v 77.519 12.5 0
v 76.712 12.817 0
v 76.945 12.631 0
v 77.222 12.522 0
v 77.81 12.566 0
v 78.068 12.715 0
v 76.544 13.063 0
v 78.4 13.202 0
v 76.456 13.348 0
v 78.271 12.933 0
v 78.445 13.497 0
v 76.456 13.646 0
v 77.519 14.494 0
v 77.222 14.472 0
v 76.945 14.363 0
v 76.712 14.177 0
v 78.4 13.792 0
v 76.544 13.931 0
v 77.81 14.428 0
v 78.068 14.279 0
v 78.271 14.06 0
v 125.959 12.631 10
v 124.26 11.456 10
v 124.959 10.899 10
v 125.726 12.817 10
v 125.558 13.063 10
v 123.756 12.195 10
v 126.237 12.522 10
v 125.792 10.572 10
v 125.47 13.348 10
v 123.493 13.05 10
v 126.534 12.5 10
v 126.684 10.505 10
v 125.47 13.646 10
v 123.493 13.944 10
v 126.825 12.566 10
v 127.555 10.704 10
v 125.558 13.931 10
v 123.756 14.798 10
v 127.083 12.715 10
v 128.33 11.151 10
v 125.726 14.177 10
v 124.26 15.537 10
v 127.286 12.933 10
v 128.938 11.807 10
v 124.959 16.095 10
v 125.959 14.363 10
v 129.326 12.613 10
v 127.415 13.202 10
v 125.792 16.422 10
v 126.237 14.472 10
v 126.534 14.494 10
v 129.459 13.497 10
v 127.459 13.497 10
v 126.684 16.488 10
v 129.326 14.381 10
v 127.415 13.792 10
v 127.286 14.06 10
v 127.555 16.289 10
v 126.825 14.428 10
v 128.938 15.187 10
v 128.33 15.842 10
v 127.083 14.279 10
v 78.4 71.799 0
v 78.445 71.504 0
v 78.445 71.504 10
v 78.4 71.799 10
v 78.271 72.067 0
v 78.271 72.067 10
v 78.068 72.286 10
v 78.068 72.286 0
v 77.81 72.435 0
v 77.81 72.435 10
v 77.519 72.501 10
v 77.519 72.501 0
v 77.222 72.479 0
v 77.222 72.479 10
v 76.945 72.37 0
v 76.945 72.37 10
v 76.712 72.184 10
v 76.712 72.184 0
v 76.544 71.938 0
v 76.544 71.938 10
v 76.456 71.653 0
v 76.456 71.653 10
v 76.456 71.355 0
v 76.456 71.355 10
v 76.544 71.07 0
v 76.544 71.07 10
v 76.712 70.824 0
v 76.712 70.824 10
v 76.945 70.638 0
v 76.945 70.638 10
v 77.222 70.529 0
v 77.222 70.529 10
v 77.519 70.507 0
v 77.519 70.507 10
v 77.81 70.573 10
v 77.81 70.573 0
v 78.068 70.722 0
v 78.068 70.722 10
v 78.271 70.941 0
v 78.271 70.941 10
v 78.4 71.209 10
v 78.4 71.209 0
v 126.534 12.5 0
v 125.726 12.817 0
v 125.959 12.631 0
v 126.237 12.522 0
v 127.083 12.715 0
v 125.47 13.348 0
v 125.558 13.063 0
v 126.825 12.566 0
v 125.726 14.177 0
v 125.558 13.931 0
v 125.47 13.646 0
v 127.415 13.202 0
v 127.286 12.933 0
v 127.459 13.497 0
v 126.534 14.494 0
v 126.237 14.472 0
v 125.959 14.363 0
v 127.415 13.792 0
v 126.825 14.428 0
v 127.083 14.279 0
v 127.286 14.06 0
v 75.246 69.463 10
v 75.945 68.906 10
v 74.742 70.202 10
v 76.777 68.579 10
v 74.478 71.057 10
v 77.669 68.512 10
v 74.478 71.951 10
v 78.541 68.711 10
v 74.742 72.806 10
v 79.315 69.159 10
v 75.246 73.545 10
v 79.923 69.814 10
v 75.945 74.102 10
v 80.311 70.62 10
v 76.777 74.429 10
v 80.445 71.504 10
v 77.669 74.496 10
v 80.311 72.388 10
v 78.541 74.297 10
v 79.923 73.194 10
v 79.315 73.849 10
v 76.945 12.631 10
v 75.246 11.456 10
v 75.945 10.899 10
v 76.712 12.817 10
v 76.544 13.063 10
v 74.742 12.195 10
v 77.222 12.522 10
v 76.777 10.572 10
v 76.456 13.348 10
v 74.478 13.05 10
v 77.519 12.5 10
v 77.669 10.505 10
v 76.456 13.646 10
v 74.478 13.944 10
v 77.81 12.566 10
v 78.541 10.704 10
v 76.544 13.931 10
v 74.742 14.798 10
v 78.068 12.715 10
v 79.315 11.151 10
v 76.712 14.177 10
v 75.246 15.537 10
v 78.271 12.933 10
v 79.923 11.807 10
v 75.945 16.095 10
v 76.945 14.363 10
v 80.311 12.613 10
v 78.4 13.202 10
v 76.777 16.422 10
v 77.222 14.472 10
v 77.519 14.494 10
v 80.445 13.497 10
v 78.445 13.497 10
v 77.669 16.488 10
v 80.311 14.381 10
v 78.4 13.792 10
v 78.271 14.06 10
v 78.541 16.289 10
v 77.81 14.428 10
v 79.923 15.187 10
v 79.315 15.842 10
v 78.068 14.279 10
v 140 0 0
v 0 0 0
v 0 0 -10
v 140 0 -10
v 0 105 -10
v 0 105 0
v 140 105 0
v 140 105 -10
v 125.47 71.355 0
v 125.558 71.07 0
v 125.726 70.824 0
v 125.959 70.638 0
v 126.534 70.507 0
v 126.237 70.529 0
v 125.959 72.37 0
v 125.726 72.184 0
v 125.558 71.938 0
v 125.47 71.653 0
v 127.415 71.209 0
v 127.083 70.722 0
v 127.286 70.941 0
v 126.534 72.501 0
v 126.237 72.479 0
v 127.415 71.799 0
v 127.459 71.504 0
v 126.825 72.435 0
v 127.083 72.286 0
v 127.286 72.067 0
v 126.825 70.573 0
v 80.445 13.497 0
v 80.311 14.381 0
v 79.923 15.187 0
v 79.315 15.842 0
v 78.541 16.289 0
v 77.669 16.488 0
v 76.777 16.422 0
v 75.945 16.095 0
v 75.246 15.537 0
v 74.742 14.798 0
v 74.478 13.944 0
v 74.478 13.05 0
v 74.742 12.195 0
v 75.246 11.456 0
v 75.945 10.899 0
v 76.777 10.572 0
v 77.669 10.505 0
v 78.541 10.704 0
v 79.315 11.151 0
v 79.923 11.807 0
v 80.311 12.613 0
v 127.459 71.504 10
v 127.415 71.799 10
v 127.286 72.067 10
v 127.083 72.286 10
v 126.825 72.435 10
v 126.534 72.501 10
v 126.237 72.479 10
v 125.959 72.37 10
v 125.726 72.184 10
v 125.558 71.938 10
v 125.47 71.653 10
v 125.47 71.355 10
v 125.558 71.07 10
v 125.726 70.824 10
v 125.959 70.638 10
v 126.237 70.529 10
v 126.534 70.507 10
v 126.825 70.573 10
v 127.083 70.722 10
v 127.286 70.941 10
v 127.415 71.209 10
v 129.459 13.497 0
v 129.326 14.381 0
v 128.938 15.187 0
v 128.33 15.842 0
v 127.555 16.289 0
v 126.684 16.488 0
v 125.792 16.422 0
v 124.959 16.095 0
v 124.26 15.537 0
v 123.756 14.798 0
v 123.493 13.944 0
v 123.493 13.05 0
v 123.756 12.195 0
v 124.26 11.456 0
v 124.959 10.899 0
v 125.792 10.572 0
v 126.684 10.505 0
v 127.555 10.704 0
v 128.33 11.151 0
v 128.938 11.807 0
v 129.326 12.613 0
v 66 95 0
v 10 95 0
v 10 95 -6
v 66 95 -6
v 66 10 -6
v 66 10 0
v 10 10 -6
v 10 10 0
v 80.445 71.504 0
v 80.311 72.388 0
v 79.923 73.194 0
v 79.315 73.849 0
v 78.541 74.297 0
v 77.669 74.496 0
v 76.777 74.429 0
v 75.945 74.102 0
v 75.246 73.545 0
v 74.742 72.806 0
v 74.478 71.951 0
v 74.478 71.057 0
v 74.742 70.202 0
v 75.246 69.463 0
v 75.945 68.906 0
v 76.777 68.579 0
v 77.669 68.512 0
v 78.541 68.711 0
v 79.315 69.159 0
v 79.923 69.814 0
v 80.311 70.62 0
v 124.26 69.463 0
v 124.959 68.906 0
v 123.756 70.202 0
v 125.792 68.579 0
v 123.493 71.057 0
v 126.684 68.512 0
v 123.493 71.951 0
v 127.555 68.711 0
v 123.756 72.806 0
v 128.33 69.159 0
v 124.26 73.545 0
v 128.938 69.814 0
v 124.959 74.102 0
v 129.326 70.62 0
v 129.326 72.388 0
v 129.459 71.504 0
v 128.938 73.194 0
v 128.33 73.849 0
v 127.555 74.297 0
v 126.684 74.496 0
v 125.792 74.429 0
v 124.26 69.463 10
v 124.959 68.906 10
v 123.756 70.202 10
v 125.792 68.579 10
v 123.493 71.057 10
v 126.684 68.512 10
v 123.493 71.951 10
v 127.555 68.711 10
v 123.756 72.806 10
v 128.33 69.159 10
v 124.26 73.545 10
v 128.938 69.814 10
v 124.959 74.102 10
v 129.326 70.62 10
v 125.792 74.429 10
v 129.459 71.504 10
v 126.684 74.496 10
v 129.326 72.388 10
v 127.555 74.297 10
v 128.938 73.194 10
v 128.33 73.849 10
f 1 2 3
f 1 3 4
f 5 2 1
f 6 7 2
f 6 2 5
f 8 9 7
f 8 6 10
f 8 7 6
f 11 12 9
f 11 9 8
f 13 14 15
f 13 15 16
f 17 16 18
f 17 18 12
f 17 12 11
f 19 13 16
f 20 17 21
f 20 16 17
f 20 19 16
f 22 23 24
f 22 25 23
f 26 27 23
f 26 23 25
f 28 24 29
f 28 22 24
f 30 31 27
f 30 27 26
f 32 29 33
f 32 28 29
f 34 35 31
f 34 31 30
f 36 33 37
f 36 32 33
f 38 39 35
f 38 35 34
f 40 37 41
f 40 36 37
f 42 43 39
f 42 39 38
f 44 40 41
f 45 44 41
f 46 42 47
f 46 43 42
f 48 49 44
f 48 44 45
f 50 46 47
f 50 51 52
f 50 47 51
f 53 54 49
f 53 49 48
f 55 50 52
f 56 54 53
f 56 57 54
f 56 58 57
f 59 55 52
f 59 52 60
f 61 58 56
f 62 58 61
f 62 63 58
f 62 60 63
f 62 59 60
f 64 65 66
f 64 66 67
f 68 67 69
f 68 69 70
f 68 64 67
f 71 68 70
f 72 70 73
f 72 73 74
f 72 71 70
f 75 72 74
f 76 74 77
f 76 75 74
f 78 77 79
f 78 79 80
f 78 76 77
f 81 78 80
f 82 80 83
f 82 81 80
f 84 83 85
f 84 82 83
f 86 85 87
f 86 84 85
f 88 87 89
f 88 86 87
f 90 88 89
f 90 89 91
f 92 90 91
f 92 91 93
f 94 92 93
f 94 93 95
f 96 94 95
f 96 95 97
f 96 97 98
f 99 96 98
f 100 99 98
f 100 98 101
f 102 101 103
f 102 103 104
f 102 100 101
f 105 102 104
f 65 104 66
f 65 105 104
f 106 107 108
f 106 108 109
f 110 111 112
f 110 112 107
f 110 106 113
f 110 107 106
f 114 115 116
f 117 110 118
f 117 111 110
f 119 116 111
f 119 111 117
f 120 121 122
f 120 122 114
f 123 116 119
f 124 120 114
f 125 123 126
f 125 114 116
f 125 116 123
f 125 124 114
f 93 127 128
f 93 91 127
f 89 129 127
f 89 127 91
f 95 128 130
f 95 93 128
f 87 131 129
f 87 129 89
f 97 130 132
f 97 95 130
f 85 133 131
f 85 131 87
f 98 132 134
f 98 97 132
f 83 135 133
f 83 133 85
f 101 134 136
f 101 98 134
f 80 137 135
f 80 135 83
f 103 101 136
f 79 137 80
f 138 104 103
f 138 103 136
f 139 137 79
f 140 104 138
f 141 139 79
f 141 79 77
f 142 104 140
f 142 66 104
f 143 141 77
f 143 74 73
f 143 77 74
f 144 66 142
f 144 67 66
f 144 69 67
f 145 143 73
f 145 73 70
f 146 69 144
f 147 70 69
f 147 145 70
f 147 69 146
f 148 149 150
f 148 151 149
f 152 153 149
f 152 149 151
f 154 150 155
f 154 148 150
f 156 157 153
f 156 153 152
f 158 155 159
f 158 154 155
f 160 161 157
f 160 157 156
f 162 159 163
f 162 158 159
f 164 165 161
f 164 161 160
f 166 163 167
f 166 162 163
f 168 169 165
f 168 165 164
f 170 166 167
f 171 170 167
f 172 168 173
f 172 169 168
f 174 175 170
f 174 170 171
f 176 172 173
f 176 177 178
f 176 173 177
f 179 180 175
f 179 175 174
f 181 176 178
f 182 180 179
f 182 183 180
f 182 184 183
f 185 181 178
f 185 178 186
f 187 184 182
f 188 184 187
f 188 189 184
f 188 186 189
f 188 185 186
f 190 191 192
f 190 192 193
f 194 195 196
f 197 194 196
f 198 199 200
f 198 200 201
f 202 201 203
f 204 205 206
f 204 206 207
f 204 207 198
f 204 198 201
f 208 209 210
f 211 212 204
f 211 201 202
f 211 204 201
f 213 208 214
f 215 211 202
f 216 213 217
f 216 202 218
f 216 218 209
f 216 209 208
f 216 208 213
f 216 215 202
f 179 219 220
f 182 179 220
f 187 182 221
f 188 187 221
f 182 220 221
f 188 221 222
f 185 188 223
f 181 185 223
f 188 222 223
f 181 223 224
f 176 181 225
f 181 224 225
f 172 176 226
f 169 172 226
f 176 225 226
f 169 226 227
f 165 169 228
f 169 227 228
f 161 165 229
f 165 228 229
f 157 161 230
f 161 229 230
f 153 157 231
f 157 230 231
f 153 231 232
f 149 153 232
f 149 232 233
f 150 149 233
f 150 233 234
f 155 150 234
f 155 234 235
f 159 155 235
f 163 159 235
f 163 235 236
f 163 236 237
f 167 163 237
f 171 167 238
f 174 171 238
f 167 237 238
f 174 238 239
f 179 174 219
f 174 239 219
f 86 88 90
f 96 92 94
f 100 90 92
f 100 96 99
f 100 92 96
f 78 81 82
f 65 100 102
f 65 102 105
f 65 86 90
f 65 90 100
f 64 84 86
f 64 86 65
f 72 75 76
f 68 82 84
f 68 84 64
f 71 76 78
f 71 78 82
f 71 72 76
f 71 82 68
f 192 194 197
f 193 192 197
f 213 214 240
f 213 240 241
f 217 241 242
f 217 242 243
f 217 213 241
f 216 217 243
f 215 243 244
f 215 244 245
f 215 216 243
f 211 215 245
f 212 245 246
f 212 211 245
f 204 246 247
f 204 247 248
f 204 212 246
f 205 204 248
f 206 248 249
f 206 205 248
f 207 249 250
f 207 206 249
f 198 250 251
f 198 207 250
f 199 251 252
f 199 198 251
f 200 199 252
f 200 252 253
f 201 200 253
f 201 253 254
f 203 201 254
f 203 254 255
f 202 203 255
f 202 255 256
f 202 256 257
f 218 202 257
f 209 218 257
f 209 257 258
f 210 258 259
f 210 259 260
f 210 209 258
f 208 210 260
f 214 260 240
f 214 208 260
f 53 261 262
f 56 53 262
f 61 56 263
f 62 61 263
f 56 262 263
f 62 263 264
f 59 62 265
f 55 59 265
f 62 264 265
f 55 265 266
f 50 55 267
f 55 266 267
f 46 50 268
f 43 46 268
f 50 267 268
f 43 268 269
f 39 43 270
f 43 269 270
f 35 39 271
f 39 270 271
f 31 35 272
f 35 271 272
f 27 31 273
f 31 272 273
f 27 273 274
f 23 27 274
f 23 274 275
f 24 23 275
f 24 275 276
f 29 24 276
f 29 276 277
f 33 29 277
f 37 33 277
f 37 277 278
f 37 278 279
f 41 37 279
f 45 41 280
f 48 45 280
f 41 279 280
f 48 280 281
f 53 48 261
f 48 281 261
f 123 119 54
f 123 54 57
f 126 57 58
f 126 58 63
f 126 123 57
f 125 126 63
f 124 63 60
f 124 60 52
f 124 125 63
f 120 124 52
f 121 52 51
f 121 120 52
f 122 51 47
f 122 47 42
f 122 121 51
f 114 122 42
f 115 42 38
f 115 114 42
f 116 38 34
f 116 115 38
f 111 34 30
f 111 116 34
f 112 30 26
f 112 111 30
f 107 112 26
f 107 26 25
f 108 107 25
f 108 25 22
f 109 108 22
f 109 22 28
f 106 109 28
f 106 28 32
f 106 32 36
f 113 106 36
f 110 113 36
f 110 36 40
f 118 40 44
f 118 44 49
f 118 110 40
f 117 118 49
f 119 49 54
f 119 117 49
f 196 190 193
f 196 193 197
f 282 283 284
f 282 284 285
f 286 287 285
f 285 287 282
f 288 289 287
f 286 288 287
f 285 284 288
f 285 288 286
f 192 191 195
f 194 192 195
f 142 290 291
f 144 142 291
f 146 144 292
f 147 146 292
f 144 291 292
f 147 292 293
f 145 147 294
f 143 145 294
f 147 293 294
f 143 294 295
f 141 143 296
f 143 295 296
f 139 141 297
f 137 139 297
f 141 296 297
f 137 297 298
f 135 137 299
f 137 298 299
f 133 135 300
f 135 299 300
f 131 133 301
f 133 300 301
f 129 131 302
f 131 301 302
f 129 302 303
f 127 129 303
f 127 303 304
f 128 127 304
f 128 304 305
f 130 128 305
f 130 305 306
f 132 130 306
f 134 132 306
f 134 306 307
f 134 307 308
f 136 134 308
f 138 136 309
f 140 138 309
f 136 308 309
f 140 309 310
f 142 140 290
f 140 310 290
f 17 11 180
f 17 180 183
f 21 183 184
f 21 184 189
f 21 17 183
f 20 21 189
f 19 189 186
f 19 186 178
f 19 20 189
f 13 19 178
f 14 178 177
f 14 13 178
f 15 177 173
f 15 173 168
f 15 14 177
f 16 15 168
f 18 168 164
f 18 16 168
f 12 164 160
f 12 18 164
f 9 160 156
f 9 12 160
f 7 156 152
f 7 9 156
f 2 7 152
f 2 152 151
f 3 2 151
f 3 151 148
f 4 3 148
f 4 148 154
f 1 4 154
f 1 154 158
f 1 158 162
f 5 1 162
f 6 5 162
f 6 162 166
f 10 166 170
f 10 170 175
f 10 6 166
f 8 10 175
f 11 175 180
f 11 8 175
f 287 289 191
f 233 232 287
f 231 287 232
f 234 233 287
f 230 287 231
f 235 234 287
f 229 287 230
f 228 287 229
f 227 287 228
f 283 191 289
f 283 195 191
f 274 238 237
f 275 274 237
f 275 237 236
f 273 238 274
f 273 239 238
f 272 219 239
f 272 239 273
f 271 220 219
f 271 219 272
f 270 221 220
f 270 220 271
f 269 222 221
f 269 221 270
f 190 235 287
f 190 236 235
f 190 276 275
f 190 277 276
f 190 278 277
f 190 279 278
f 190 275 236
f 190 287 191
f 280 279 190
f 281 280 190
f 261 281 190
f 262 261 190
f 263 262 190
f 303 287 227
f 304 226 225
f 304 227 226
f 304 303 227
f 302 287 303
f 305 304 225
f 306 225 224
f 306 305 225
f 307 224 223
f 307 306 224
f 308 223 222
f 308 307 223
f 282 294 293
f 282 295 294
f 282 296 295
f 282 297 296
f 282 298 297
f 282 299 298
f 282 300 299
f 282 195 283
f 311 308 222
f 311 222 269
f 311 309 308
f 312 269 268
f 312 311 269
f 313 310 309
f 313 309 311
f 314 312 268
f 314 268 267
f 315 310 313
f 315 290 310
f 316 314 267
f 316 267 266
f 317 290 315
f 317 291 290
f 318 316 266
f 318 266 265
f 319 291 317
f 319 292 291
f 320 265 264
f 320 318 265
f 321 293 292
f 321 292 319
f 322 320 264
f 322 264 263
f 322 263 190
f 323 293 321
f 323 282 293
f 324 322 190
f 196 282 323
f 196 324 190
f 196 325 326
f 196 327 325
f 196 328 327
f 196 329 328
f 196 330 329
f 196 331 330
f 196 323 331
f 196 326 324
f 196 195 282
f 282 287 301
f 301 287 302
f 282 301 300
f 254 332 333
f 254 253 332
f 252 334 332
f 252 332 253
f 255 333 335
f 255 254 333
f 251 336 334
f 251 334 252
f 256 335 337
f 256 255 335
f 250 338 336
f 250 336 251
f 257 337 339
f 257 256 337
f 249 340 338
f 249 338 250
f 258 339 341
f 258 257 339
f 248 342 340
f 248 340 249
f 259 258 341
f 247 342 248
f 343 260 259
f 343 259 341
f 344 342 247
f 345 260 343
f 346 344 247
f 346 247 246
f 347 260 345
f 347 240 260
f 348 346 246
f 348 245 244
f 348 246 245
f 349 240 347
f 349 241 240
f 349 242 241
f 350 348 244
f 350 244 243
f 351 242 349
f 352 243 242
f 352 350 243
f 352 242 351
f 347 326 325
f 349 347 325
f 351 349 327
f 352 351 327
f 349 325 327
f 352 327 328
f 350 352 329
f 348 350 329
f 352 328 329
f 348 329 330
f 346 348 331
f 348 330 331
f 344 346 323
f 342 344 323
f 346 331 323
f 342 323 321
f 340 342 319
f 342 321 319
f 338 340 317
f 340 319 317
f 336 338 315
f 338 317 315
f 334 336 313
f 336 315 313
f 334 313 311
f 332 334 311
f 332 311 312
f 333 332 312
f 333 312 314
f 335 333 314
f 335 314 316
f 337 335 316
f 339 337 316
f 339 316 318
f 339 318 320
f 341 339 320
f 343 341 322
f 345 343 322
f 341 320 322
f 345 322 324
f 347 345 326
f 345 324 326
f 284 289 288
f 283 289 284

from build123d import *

# Parameters (mm, degrees)
F0_W     = 140
F0_H     = 105
F1_DEPTH = 10
F2_R     = 3
F2_R_2   = 1
F3_DEPTH = 10
F4_W     = 56
F4_H     = 85
F5_DEPTH = 6


with BuildPart() as f1:
    # F0 (on Top) → F1 (new body)
    with BuildSketch(Plane.XY):
        with Locations((70, 52.5)):
            Rectangle(F0_W, F0_H)
    extrude(amount=-F1_DEPTH)

    # F2 (on Top) → F3 (join)
    with BuildSketch(Plane.XY):
        with Locations((77.444687, 71.503997)):
            Circle(F2_R)
        with Locations((77.444687, 71.503997)):
            Circle(F2_R_2, mode=Mode.SUBTRACT)
        with Locations((126.459315, 71.503997)):
            Circle(F2_R)
        with Locations((126.459315, 71.503997)):
            Circle(F2_R_2, mode=Mode.SUBTRACT)
        with Locations((126.459315, 13.496778)):
            Circle(F2_R)
        with Locations((126.459315, 13.496778)):
            Circle(F2_R_2, mode=Mode.SUBTRACT)
        with Locations((77.444687, 13.496778)):
            Circle(F2_R)
        with Locations((77.444687, 13.496778)):
            Circle(F2_R_2, mode=Mode.SUBTRACT)
    extrude(amount=F3_DEPTH)

    # F4 (on face) → F5 (cut)
    with BuildSketch(Plane.XY):
        with Locations((38, 52.5)):
            Rectangle(F4_W, F4_H)
    extrude(amount=-F5_DEPTH, mode=Mode.SUBTRACT)


solid = f1.part
